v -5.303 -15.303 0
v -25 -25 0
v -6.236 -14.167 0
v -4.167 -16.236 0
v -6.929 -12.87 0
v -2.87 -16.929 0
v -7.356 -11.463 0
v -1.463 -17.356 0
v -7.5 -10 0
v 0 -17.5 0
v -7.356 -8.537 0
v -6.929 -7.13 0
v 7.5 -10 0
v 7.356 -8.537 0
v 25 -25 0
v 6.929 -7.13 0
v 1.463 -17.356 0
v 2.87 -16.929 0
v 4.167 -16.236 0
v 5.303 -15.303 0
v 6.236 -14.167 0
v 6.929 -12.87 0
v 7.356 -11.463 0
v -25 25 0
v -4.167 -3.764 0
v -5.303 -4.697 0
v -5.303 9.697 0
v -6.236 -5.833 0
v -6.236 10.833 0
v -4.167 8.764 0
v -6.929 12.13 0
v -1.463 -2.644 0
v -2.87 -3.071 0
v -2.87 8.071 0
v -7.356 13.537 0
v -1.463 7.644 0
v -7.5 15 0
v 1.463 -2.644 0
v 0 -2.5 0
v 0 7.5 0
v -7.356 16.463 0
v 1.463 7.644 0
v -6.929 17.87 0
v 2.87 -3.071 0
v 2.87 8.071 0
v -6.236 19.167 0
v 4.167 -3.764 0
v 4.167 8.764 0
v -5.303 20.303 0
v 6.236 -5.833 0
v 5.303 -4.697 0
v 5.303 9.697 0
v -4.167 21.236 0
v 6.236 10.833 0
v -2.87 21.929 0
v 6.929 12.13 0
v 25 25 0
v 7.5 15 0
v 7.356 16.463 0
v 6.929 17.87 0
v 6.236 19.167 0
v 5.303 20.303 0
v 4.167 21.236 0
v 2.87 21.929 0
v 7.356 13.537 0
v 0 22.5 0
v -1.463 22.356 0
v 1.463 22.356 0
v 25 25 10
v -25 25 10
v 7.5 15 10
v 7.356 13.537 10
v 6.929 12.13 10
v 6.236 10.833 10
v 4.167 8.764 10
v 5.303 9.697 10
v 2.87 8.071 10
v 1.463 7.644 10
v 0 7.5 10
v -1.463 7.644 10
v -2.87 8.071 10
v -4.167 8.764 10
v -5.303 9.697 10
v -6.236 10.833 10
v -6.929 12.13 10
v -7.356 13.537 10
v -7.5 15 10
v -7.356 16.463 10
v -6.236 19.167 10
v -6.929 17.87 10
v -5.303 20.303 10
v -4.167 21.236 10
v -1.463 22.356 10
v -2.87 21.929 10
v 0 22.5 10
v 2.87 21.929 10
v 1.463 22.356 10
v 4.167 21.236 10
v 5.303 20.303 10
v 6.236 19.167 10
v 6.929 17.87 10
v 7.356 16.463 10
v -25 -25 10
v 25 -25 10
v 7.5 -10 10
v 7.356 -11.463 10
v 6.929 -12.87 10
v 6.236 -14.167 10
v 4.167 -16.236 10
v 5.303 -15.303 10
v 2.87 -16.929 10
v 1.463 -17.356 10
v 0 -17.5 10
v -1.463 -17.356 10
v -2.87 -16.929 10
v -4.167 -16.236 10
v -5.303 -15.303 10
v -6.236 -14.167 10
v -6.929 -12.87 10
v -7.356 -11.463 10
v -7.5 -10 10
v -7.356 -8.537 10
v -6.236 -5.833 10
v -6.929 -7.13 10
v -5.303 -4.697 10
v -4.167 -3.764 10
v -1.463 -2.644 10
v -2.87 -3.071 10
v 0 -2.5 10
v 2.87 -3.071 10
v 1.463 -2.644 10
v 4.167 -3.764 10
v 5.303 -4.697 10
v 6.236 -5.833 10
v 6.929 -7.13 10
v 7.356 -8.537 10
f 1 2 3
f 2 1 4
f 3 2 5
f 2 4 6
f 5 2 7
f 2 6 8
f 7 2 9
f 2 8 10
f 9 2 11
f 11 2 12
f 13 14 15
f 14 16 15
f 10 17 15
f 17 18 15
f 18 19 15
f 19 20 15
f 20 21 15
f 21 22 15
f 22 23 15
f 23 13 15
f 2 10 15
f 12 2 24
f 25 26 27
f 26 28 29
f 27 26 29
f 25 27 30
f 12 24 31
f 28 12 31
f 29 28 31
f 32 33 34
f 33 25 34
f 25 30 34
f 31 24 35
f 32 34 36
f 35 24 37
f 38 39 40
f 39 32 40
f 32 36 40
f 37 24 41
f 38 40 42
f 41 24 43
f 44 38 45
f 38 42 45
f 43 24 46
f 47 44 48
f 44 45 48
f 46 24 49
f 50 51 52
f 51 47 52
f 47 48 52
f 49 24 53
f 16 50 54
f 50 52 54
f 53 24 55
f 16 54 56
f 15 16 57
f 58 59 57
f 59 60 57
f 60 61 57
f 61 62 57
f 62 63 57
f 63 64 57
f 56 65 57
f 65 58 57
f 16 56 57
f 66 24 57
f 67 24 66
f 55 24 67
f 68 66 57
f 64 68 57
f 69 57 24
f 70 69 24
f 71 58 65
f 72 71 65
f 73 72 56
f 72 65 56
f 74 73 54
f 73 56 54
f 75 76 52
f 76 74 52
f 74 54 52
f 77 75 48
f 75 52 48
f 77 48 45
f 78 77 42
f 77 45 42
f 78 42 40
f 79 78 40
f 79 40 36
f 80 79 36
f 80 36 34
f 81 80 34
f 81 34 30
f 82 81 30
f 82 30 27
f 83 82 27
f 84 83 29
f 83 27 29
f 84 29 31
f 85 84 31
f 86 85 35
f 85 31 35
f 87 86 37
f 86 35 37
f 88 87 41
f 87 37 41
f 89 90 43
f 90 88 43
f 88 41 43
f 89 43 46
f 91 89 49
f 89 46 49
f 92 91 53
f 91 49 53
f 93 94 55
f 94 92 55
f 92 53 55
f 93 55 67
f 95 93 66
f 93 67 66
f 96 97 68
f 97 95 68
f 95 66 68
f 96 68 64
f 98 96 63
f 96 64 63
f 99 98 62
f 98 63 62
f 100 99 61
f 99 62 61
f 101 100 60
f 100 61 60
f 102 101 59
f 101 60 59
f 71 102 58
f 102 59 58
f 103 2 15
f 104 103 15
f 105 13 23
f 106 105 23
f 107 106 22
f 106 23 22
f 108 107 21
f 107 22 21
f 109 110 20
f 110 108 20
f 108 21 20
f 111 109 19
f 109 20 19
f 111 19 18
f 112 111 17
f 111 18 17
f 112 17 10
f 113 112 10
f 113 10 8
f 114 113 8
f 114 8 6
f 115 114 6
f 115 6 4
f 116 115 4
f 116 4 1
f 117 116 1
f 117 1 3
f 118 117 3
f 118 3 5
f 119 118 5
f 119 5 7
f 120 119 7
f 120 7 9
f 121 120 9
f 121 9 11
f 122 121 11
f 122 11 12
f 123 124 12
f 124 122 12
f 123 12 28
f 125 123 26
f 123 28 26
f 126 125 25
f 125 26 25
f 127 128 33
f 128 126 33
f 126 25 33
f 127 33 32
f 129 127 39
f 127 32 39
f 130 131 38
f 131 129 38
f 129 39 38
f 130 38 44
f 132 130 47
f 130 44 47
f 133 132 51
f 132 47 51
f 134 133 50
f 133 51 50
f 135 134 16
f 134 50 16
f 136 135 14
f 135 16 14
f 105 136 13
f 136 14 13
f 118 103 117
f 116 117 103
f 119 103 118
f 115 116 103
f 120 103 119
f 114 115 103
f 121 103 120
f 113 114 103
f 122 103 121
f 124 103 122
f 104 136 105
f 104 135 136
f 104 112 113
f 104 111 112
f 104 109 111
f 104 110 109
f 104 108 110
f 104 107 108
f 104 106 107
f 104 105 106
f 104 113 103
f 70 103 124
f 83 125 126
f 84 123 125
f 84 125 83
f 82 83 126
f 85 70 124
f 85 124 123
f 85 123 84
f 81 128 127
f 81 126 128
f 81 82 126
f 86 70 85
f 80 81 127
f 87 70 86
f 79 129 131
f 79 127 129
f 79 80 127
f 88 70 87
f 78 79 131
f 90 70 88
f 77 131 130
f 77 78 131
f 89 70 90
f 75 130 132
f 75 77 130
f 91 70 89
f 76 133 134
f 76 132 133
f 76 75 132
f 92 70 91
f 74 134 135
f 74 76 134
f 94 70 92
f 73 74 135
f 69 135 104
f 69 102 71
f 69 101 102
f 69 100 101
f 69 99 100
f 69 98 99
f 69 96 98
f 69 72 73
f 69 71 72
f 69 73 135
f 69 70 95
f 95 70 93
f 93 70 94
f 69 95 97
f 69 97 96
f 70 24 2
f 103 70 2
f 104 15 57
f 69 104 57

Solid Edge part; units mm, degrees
sketch "Sketch1" plane through (0, 0, 0) normal (0, 0, 1) x (1, 0, 0)
  circle A0 centre (0, 15) radius 7.5
  circle A1 centre (0, -10) radius 7.5
  line L0 (25, 25) -> (-25, 25)
  line L1 (-25, 25) -> (-25, -25)
  line L2 (-25, -25) -> (25, -25)
  line L3 (25, -25) -> (25, 25)
  dimension "D1" = 25
  dimension "D2" = 50
  dimension "D3" = 15
  dimension "D4" = 50
  dimension "D5" = 15
extrude "Protrusion1" add sketch "Sketch1" along normal blind 10
